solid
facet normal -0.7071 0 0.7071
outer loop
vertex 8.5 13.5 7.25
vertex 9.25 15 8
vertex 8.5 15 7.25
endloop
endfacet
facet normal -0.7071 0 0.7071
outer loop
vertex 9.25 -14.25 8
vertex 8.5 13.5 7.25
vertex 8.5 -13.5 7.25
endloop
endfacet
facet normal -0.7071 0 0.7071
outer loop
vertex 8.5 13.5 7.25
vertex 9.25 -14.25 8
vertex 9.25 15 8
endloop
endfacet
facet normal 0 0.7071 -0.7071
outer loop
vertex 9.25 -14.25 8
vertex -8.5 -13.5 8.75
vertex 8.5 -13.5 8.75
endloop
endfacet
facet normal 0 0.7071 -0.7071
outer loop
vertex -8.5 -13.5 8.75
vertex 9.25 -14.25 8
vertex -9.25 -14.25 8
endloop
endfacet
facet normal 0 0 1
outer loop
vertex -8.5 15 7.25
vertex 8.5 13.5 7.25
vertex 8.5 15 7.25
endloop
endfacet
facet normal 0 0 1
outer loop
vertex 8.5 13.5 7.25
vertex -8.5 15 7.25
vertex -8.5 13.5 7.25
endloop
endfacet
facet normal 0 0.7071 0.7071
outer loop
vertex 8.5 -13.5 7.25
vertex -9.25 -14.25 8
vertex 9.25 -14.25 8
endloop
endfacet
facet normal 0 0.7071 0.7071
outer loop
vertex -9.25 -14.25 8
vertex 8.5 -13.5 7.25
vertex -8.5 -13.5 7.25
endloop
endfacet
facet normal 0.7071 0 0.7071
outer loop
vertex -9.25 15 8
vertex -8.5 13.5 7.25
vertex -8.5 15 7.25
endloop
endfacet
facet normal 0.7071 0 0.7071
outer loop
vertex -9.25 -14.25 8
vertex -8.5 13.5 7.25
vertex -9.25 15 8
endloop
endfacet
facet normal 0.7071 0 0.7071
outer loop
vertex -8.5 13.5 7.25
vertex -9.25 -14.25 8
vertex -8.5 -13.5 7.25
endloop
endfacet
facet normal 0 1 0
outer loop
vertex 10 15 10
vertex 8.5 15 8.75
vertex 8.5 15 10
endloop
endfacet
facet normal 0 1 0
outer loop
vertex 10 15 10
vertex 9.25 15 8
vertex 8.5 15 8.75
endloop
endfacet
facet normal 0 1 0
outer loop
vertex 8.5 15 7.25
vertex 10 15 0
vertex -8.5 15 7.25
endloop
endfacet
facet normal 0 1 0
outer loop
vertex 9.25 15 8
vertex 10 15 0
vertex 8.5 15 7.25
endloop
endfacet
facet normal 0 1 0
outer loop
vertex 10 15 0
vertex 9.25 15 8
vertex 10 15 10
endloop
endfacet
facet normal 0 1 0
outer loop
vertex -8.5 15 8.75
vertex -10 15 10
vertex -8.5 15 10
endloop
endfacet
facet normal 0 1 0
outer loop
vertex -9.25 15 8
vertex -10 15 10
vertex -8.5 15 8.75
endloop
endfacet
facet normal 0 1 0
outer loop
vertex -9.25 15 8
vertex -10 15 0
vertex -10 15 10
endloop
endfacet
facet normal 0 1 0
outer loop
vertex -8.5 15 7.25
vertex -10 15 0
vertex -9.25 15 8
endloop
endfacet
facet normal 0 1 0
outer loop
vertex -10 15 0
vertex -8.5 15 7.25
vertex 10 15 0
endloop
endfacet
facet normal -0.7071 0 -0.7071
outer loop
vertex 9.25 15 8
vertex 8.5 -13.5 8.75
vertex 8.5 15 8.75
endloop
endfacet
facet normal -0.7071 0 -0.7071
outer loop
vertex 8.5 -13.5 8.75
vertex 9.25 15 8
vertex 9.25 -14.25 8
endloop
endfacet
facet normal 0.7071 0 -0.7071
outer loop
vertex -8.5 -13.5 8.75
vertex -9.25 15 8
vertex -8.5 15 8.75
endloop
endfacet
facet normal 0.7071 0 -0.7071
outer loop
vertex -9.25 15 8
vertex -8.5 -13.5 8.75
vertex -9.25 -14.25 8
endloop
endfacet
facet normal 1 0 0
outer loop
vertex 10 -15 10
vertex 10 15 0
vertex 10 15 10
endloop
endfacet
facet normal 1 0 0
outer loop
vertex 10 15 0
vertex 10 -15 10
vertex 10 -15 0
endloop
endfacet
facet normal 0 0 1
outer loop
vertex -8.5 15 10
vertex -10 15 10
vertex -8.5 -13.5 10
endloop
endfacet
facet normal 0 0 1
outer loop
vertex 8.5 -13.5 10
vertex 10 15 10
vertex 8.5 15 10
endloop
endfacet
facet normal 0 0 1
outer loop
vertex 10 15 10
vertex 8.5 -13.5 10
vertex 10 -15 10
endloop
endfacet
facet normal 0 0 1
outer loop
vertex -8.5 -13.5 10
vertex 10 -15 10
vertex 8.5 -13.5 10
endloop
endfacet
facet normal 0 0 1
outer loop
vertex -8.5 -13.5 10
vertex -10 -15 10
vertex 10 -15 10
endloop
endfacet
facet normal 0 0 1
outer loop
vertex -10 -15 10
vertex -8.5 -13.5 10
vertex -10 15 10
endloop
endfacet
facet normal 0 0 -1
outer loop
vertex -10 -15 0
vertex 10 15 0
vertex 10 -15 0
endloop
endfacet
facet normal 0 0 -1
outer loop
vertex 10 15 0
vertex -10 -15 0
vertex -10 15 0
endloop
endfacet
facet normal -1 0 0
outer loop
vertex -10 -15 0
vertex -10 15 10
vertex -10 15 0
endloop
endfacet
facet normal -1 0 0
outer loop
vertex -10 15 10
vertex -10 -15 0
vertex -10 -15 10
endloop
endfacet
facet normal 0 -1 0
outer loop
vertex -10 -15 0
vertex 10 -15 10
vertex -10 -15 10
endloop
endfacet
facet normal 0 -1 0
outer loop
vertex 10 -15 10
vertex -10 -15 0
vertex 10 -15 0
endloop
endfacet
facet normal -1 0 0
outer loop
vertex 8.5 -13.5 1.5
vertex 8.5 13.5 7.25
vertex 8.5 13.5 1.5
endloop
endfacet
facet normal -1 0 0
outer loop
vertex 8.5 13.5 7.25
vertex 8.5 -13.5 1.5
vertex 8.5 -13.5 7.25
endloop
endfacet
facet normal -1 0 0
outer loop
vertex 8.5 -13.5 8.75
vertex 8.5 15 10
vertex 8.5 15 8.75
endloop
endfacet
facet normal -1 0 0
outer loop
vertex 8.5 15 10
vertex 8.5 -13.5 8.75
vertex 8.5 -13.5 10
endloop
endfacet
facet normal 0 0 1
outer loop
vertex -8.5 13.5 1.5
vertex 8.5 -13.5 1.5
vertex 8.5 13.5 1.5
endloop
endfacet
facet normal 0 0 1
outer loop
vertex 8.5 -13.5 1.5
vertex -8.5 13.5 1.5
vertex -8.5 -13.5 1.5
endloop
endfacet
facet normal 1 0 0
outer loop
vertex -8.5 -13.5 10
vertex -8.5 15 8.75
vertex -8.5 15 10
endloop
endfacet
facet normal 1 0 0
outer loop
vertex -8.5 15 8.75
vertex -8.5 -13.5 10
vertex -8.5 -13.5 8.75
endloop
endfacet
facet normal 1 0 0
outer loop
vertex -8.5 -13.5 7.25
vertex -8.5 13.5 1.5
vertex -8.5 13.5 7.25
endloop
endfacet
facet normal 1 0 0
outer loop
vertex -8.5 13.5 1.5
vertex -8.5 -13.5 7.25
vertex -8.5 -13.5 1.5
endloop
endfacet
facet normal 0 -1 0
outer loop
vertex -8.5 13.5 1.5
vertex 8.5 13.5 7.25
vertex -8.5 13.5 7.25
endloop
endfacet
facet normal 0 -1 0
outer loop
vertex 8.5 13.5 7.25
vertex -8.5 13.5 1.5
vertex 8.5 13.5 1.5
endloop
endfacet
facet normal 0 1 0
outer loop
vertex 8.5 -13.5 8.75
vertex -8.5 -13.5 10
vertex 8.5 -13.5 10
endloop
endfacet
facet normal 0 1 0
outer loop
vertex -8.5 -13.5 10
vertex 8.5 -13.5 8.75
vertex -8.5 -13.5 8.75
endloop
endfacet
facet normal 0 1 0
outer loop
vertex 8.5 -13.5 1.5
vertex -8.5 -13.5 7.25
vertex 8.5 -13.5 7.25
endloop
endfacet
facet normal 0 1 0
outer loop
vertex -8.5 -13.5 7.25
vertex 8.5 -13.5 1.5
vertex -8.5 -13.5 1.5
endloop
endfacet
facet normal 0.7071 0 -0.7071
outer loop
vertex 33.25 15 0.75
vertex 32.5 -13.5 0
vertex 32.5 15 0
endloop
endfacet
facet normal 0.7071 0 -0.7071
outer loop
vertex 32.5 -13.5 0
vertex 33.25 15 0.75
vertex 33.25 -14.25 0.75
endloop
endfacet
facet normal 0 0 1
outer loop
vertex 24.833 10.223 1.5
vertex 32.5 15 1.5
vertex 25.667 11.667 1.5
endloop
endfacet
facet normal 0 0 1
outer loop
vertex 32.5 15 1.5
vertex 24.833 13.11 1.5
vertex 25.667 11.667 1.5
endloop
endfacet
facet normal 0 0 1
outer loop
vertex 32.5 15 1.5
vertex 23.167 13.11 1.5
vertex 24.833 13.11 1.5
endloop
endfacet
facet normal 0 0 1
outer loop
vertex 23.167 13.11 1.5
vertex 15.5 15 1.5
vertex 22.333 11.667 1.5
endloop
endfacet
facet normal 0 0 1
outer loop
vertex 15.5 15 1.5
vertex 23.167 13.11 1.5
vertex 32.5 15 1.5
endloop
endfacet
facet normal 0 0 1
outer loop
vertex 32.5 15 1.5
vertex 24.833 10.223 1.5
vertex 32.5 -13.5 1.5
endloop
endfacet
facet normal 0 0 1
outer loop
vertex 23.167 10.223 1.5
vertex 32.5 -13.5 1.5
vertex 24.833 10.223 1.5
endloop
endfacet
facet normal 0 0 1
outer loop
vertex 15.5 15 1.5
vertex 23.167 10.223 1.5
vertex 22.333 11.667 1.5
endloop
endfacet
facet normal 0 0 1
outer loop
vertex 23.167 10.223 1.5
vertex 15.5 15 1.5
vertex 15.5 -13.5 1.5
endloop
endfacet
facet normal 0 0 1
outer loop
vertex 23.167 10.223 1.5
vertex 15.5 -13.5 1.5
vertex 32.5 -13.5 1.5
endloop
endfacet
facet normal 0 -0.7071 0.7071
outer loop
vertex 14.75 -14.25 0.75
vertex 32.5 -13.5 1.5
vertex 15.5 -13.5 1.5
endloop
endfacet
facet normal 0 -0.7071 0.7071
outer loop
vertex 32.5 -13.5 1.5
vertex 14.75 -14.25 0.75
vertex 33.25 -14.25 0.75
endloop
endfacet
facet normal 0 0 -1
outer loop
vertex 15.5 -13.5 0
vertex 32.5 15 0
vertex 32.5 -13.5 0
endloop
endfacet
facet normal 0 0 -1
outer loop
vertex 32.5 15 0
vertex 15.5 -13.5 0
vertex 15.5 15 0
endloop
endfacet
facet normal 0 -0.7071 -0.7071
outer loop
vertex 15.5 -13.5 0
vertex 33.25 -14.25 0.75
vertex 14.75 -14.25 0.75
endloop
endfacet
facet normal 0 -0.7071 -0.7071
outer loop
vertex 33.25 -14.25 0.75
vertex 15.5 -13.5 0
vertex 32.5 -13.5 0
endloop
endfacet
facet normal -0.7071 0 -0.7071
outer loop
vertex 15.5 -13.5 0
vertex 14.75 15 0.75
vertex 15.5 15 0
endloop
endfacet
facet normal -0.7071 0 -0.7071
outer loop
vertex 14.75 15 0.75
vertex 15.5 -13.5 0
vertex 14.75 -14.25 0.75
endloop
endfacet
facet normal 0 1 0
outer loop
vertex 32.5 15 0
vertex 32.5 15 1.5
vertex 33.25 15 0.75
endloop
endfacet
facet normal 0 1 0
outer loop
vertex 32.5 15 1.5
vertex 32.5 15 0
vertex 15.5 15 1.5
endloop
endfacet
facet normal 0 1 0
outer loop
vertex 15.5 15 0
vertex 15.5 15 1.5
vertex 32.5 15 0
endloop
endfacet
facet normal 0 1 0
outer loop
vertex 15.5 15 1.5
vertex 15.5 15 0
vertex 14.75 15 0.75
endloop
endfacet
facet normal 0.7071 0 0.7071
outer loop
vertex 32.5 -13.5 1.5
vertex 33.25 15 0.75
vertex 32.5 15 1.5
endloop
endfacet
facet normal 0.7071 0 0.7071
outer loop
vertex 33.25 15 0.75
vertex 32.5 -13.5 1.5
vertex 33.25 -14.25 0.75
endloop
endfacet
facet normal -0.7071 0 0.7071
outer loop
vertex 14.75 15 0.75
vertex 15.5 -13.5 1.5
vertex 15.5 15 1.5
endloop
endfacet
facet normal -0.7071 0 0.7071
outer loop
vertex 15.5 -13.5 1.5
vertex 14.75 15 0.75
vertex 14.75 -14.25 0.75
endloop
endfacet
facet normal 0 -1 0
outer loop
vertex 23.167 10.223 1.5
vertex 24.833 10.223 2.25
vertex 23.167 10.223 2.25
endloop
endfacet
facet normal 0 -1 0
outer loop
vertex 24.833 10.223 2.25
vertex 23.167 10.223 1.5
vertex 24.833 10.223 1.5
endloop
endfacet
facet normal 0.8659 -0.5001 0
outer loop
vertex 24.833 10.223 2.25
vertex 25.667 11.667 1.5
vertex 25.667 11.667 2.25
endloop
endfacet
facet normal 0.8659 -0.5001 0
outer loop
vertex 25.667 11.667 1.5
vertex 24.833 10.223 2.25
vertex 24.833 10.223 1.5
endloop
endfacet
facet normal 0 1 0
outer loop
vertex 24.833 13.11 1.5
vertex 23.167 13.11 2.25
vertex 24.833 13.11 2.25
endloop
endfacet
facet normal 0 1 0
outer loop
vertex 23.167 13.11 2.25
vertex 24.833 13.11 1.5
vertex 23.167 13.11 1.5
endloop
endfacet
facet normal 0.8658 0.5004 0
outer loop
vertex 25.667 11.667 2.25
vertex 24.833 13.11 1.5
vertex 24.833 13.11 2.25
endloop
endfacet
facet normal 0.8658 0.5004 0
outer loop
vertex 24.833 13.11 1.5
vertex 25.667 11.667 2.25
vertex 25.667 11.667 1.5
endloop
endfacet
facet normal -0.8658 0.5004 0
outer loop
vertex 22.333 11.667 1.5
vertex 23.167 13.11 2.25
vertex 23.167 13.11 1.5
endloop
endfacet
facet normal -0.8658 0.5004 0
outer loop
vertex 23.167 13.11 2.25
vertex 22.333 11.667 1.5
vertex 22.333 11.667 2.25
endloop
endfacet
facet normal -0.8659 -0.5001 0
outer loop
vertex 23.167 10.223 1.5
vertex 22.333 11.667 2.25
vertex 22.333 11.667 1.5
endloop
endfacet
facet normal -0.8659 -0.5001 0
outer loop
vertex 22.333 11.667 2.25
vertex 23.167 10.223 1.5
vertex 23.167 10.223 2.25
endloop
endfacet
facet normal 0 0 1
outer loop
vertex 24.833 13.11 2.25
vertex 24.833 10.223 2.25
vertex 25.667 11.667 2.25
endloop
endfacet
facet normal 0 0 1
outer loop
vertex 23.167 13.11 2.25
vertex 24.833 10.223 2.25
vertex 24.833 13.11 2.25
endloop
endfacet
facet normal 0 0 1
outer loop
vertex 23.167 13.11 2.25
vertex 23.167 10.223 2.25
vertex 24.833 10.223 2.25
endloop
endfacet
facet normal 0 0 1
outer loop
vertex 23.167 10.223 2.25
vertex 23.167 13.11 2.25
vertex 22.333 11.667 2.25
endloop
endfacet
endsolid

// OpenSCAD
// Parameterized box generator
// Written by Brad Koehn
// Requires OpenSCAD 2014.03 or newer

// box dimensions
// typically you want the height < length < width
box_length = 20; // x axis
box_width = 30;  // y axis
box_height = 10; // z axis

// width of all walls and lid
wall_width = 1.5;

// how far from the top of the box the lid notch should go
notch_height = 4;

// how deep into the wall the lid notch should go
notch_depth = wall_width / 2;

// diameter of button on lid; set to 0 for no button
button_diameter = box_length / 6;

// height of button on lid
button_height = wall_width / 2;

// the box
translate([0, 0, box_height / 2])
difference () {
	// our solid box
	cube([box_length, box_width, box_height], center = true);

	// remove the inside
	translate([0, 0, wall_width / 2])
		cube([box_length - wall_width * 2, box_width - wall_width * 2, box_height - wall_width], center = true);
	
	// remove notch for lid
	translate([0, 0, box_height / 2 - notch_height / 2])
		lid();

	// remove the unnecessary part of box where the lid slides in
	translate([0, wall_width / 2, box_height / 2 ])
		cube([box_length - wall_width * 2, box_width - wall_width, notch_height], center = true);
};


// the lid
translate([box_length + 4, 0, wall_width / 2]) 
	lid();

module lid() { 
	union() {
		polyhedron(
			points = [
				// top points, clockwise starting at max x, max y
				[box_length / 2 - wall_width, box_width / 2, notch_depth], // 0
				[box_length / 2 - wall_width, -(box_width / 2 - wall_width), notch_depth], // 1
				[-(box_length / 2 - wall_width), -(box_width / 2 - wall_width), notch_depth], // 2
				[-(box_length / 2 - wall_width), box_width / 2, notch_depth], // 3		

				// middle points, clockwise starting at max x, max y
				[box_length / 2 - wall_width + notch_depth, box_width / 2, 0], // 4
				[box_length / 2 - wall_width + notch_depth, -(box_width / 2 - wall_width + notch_depth), 0], // 5
				[-(box_length / 2 - wall_width  + notch_depth), -(box_width / 2 - wall_width + notch_depth), 0], // 6
				[-(box_length / 2 - wall_width  + notch_depth), box_width / 2, 0], // 7

				// bottom points, clockwise starting at max x, max y
				[box_length / 2 - wall_width, box_width / 2, -notch_depth], // 8
				[box_length / 2 - wall_width, -(box_width / 2 - wall_width), -notch_depth], // 9
				[-(box_length / 2 - wall_width), -(box_width / 2 - wall_width), -notch_depth], // 10
				[-(box_length / 2 - wall_width), box_width / 2, -notch_depth], // 11
			],
			faces = [
				[0, 1, 2, 3], // top face	

				[0, 4, 5, 1], // left top notch
				[1, 5, 6, 2], // back top notch
				[3, 2, 6, 7], // right top notch

				[4, 8, 9, 5], // left bottom notch
				[5, 9, 10, 6], // back botton notch
				[7, 6, 10, 11], // right bottom notch

				[11, 10, 9, 8], // bottom face

				[0, 3, 7, 11, 8, 4] // front face
			]
		);
	
		translate([0, box_width / 2 - button_diameter, wall_width / 2])
			cylinder(
				d = button_diameter,
				h = button_height
			);
	};
}
